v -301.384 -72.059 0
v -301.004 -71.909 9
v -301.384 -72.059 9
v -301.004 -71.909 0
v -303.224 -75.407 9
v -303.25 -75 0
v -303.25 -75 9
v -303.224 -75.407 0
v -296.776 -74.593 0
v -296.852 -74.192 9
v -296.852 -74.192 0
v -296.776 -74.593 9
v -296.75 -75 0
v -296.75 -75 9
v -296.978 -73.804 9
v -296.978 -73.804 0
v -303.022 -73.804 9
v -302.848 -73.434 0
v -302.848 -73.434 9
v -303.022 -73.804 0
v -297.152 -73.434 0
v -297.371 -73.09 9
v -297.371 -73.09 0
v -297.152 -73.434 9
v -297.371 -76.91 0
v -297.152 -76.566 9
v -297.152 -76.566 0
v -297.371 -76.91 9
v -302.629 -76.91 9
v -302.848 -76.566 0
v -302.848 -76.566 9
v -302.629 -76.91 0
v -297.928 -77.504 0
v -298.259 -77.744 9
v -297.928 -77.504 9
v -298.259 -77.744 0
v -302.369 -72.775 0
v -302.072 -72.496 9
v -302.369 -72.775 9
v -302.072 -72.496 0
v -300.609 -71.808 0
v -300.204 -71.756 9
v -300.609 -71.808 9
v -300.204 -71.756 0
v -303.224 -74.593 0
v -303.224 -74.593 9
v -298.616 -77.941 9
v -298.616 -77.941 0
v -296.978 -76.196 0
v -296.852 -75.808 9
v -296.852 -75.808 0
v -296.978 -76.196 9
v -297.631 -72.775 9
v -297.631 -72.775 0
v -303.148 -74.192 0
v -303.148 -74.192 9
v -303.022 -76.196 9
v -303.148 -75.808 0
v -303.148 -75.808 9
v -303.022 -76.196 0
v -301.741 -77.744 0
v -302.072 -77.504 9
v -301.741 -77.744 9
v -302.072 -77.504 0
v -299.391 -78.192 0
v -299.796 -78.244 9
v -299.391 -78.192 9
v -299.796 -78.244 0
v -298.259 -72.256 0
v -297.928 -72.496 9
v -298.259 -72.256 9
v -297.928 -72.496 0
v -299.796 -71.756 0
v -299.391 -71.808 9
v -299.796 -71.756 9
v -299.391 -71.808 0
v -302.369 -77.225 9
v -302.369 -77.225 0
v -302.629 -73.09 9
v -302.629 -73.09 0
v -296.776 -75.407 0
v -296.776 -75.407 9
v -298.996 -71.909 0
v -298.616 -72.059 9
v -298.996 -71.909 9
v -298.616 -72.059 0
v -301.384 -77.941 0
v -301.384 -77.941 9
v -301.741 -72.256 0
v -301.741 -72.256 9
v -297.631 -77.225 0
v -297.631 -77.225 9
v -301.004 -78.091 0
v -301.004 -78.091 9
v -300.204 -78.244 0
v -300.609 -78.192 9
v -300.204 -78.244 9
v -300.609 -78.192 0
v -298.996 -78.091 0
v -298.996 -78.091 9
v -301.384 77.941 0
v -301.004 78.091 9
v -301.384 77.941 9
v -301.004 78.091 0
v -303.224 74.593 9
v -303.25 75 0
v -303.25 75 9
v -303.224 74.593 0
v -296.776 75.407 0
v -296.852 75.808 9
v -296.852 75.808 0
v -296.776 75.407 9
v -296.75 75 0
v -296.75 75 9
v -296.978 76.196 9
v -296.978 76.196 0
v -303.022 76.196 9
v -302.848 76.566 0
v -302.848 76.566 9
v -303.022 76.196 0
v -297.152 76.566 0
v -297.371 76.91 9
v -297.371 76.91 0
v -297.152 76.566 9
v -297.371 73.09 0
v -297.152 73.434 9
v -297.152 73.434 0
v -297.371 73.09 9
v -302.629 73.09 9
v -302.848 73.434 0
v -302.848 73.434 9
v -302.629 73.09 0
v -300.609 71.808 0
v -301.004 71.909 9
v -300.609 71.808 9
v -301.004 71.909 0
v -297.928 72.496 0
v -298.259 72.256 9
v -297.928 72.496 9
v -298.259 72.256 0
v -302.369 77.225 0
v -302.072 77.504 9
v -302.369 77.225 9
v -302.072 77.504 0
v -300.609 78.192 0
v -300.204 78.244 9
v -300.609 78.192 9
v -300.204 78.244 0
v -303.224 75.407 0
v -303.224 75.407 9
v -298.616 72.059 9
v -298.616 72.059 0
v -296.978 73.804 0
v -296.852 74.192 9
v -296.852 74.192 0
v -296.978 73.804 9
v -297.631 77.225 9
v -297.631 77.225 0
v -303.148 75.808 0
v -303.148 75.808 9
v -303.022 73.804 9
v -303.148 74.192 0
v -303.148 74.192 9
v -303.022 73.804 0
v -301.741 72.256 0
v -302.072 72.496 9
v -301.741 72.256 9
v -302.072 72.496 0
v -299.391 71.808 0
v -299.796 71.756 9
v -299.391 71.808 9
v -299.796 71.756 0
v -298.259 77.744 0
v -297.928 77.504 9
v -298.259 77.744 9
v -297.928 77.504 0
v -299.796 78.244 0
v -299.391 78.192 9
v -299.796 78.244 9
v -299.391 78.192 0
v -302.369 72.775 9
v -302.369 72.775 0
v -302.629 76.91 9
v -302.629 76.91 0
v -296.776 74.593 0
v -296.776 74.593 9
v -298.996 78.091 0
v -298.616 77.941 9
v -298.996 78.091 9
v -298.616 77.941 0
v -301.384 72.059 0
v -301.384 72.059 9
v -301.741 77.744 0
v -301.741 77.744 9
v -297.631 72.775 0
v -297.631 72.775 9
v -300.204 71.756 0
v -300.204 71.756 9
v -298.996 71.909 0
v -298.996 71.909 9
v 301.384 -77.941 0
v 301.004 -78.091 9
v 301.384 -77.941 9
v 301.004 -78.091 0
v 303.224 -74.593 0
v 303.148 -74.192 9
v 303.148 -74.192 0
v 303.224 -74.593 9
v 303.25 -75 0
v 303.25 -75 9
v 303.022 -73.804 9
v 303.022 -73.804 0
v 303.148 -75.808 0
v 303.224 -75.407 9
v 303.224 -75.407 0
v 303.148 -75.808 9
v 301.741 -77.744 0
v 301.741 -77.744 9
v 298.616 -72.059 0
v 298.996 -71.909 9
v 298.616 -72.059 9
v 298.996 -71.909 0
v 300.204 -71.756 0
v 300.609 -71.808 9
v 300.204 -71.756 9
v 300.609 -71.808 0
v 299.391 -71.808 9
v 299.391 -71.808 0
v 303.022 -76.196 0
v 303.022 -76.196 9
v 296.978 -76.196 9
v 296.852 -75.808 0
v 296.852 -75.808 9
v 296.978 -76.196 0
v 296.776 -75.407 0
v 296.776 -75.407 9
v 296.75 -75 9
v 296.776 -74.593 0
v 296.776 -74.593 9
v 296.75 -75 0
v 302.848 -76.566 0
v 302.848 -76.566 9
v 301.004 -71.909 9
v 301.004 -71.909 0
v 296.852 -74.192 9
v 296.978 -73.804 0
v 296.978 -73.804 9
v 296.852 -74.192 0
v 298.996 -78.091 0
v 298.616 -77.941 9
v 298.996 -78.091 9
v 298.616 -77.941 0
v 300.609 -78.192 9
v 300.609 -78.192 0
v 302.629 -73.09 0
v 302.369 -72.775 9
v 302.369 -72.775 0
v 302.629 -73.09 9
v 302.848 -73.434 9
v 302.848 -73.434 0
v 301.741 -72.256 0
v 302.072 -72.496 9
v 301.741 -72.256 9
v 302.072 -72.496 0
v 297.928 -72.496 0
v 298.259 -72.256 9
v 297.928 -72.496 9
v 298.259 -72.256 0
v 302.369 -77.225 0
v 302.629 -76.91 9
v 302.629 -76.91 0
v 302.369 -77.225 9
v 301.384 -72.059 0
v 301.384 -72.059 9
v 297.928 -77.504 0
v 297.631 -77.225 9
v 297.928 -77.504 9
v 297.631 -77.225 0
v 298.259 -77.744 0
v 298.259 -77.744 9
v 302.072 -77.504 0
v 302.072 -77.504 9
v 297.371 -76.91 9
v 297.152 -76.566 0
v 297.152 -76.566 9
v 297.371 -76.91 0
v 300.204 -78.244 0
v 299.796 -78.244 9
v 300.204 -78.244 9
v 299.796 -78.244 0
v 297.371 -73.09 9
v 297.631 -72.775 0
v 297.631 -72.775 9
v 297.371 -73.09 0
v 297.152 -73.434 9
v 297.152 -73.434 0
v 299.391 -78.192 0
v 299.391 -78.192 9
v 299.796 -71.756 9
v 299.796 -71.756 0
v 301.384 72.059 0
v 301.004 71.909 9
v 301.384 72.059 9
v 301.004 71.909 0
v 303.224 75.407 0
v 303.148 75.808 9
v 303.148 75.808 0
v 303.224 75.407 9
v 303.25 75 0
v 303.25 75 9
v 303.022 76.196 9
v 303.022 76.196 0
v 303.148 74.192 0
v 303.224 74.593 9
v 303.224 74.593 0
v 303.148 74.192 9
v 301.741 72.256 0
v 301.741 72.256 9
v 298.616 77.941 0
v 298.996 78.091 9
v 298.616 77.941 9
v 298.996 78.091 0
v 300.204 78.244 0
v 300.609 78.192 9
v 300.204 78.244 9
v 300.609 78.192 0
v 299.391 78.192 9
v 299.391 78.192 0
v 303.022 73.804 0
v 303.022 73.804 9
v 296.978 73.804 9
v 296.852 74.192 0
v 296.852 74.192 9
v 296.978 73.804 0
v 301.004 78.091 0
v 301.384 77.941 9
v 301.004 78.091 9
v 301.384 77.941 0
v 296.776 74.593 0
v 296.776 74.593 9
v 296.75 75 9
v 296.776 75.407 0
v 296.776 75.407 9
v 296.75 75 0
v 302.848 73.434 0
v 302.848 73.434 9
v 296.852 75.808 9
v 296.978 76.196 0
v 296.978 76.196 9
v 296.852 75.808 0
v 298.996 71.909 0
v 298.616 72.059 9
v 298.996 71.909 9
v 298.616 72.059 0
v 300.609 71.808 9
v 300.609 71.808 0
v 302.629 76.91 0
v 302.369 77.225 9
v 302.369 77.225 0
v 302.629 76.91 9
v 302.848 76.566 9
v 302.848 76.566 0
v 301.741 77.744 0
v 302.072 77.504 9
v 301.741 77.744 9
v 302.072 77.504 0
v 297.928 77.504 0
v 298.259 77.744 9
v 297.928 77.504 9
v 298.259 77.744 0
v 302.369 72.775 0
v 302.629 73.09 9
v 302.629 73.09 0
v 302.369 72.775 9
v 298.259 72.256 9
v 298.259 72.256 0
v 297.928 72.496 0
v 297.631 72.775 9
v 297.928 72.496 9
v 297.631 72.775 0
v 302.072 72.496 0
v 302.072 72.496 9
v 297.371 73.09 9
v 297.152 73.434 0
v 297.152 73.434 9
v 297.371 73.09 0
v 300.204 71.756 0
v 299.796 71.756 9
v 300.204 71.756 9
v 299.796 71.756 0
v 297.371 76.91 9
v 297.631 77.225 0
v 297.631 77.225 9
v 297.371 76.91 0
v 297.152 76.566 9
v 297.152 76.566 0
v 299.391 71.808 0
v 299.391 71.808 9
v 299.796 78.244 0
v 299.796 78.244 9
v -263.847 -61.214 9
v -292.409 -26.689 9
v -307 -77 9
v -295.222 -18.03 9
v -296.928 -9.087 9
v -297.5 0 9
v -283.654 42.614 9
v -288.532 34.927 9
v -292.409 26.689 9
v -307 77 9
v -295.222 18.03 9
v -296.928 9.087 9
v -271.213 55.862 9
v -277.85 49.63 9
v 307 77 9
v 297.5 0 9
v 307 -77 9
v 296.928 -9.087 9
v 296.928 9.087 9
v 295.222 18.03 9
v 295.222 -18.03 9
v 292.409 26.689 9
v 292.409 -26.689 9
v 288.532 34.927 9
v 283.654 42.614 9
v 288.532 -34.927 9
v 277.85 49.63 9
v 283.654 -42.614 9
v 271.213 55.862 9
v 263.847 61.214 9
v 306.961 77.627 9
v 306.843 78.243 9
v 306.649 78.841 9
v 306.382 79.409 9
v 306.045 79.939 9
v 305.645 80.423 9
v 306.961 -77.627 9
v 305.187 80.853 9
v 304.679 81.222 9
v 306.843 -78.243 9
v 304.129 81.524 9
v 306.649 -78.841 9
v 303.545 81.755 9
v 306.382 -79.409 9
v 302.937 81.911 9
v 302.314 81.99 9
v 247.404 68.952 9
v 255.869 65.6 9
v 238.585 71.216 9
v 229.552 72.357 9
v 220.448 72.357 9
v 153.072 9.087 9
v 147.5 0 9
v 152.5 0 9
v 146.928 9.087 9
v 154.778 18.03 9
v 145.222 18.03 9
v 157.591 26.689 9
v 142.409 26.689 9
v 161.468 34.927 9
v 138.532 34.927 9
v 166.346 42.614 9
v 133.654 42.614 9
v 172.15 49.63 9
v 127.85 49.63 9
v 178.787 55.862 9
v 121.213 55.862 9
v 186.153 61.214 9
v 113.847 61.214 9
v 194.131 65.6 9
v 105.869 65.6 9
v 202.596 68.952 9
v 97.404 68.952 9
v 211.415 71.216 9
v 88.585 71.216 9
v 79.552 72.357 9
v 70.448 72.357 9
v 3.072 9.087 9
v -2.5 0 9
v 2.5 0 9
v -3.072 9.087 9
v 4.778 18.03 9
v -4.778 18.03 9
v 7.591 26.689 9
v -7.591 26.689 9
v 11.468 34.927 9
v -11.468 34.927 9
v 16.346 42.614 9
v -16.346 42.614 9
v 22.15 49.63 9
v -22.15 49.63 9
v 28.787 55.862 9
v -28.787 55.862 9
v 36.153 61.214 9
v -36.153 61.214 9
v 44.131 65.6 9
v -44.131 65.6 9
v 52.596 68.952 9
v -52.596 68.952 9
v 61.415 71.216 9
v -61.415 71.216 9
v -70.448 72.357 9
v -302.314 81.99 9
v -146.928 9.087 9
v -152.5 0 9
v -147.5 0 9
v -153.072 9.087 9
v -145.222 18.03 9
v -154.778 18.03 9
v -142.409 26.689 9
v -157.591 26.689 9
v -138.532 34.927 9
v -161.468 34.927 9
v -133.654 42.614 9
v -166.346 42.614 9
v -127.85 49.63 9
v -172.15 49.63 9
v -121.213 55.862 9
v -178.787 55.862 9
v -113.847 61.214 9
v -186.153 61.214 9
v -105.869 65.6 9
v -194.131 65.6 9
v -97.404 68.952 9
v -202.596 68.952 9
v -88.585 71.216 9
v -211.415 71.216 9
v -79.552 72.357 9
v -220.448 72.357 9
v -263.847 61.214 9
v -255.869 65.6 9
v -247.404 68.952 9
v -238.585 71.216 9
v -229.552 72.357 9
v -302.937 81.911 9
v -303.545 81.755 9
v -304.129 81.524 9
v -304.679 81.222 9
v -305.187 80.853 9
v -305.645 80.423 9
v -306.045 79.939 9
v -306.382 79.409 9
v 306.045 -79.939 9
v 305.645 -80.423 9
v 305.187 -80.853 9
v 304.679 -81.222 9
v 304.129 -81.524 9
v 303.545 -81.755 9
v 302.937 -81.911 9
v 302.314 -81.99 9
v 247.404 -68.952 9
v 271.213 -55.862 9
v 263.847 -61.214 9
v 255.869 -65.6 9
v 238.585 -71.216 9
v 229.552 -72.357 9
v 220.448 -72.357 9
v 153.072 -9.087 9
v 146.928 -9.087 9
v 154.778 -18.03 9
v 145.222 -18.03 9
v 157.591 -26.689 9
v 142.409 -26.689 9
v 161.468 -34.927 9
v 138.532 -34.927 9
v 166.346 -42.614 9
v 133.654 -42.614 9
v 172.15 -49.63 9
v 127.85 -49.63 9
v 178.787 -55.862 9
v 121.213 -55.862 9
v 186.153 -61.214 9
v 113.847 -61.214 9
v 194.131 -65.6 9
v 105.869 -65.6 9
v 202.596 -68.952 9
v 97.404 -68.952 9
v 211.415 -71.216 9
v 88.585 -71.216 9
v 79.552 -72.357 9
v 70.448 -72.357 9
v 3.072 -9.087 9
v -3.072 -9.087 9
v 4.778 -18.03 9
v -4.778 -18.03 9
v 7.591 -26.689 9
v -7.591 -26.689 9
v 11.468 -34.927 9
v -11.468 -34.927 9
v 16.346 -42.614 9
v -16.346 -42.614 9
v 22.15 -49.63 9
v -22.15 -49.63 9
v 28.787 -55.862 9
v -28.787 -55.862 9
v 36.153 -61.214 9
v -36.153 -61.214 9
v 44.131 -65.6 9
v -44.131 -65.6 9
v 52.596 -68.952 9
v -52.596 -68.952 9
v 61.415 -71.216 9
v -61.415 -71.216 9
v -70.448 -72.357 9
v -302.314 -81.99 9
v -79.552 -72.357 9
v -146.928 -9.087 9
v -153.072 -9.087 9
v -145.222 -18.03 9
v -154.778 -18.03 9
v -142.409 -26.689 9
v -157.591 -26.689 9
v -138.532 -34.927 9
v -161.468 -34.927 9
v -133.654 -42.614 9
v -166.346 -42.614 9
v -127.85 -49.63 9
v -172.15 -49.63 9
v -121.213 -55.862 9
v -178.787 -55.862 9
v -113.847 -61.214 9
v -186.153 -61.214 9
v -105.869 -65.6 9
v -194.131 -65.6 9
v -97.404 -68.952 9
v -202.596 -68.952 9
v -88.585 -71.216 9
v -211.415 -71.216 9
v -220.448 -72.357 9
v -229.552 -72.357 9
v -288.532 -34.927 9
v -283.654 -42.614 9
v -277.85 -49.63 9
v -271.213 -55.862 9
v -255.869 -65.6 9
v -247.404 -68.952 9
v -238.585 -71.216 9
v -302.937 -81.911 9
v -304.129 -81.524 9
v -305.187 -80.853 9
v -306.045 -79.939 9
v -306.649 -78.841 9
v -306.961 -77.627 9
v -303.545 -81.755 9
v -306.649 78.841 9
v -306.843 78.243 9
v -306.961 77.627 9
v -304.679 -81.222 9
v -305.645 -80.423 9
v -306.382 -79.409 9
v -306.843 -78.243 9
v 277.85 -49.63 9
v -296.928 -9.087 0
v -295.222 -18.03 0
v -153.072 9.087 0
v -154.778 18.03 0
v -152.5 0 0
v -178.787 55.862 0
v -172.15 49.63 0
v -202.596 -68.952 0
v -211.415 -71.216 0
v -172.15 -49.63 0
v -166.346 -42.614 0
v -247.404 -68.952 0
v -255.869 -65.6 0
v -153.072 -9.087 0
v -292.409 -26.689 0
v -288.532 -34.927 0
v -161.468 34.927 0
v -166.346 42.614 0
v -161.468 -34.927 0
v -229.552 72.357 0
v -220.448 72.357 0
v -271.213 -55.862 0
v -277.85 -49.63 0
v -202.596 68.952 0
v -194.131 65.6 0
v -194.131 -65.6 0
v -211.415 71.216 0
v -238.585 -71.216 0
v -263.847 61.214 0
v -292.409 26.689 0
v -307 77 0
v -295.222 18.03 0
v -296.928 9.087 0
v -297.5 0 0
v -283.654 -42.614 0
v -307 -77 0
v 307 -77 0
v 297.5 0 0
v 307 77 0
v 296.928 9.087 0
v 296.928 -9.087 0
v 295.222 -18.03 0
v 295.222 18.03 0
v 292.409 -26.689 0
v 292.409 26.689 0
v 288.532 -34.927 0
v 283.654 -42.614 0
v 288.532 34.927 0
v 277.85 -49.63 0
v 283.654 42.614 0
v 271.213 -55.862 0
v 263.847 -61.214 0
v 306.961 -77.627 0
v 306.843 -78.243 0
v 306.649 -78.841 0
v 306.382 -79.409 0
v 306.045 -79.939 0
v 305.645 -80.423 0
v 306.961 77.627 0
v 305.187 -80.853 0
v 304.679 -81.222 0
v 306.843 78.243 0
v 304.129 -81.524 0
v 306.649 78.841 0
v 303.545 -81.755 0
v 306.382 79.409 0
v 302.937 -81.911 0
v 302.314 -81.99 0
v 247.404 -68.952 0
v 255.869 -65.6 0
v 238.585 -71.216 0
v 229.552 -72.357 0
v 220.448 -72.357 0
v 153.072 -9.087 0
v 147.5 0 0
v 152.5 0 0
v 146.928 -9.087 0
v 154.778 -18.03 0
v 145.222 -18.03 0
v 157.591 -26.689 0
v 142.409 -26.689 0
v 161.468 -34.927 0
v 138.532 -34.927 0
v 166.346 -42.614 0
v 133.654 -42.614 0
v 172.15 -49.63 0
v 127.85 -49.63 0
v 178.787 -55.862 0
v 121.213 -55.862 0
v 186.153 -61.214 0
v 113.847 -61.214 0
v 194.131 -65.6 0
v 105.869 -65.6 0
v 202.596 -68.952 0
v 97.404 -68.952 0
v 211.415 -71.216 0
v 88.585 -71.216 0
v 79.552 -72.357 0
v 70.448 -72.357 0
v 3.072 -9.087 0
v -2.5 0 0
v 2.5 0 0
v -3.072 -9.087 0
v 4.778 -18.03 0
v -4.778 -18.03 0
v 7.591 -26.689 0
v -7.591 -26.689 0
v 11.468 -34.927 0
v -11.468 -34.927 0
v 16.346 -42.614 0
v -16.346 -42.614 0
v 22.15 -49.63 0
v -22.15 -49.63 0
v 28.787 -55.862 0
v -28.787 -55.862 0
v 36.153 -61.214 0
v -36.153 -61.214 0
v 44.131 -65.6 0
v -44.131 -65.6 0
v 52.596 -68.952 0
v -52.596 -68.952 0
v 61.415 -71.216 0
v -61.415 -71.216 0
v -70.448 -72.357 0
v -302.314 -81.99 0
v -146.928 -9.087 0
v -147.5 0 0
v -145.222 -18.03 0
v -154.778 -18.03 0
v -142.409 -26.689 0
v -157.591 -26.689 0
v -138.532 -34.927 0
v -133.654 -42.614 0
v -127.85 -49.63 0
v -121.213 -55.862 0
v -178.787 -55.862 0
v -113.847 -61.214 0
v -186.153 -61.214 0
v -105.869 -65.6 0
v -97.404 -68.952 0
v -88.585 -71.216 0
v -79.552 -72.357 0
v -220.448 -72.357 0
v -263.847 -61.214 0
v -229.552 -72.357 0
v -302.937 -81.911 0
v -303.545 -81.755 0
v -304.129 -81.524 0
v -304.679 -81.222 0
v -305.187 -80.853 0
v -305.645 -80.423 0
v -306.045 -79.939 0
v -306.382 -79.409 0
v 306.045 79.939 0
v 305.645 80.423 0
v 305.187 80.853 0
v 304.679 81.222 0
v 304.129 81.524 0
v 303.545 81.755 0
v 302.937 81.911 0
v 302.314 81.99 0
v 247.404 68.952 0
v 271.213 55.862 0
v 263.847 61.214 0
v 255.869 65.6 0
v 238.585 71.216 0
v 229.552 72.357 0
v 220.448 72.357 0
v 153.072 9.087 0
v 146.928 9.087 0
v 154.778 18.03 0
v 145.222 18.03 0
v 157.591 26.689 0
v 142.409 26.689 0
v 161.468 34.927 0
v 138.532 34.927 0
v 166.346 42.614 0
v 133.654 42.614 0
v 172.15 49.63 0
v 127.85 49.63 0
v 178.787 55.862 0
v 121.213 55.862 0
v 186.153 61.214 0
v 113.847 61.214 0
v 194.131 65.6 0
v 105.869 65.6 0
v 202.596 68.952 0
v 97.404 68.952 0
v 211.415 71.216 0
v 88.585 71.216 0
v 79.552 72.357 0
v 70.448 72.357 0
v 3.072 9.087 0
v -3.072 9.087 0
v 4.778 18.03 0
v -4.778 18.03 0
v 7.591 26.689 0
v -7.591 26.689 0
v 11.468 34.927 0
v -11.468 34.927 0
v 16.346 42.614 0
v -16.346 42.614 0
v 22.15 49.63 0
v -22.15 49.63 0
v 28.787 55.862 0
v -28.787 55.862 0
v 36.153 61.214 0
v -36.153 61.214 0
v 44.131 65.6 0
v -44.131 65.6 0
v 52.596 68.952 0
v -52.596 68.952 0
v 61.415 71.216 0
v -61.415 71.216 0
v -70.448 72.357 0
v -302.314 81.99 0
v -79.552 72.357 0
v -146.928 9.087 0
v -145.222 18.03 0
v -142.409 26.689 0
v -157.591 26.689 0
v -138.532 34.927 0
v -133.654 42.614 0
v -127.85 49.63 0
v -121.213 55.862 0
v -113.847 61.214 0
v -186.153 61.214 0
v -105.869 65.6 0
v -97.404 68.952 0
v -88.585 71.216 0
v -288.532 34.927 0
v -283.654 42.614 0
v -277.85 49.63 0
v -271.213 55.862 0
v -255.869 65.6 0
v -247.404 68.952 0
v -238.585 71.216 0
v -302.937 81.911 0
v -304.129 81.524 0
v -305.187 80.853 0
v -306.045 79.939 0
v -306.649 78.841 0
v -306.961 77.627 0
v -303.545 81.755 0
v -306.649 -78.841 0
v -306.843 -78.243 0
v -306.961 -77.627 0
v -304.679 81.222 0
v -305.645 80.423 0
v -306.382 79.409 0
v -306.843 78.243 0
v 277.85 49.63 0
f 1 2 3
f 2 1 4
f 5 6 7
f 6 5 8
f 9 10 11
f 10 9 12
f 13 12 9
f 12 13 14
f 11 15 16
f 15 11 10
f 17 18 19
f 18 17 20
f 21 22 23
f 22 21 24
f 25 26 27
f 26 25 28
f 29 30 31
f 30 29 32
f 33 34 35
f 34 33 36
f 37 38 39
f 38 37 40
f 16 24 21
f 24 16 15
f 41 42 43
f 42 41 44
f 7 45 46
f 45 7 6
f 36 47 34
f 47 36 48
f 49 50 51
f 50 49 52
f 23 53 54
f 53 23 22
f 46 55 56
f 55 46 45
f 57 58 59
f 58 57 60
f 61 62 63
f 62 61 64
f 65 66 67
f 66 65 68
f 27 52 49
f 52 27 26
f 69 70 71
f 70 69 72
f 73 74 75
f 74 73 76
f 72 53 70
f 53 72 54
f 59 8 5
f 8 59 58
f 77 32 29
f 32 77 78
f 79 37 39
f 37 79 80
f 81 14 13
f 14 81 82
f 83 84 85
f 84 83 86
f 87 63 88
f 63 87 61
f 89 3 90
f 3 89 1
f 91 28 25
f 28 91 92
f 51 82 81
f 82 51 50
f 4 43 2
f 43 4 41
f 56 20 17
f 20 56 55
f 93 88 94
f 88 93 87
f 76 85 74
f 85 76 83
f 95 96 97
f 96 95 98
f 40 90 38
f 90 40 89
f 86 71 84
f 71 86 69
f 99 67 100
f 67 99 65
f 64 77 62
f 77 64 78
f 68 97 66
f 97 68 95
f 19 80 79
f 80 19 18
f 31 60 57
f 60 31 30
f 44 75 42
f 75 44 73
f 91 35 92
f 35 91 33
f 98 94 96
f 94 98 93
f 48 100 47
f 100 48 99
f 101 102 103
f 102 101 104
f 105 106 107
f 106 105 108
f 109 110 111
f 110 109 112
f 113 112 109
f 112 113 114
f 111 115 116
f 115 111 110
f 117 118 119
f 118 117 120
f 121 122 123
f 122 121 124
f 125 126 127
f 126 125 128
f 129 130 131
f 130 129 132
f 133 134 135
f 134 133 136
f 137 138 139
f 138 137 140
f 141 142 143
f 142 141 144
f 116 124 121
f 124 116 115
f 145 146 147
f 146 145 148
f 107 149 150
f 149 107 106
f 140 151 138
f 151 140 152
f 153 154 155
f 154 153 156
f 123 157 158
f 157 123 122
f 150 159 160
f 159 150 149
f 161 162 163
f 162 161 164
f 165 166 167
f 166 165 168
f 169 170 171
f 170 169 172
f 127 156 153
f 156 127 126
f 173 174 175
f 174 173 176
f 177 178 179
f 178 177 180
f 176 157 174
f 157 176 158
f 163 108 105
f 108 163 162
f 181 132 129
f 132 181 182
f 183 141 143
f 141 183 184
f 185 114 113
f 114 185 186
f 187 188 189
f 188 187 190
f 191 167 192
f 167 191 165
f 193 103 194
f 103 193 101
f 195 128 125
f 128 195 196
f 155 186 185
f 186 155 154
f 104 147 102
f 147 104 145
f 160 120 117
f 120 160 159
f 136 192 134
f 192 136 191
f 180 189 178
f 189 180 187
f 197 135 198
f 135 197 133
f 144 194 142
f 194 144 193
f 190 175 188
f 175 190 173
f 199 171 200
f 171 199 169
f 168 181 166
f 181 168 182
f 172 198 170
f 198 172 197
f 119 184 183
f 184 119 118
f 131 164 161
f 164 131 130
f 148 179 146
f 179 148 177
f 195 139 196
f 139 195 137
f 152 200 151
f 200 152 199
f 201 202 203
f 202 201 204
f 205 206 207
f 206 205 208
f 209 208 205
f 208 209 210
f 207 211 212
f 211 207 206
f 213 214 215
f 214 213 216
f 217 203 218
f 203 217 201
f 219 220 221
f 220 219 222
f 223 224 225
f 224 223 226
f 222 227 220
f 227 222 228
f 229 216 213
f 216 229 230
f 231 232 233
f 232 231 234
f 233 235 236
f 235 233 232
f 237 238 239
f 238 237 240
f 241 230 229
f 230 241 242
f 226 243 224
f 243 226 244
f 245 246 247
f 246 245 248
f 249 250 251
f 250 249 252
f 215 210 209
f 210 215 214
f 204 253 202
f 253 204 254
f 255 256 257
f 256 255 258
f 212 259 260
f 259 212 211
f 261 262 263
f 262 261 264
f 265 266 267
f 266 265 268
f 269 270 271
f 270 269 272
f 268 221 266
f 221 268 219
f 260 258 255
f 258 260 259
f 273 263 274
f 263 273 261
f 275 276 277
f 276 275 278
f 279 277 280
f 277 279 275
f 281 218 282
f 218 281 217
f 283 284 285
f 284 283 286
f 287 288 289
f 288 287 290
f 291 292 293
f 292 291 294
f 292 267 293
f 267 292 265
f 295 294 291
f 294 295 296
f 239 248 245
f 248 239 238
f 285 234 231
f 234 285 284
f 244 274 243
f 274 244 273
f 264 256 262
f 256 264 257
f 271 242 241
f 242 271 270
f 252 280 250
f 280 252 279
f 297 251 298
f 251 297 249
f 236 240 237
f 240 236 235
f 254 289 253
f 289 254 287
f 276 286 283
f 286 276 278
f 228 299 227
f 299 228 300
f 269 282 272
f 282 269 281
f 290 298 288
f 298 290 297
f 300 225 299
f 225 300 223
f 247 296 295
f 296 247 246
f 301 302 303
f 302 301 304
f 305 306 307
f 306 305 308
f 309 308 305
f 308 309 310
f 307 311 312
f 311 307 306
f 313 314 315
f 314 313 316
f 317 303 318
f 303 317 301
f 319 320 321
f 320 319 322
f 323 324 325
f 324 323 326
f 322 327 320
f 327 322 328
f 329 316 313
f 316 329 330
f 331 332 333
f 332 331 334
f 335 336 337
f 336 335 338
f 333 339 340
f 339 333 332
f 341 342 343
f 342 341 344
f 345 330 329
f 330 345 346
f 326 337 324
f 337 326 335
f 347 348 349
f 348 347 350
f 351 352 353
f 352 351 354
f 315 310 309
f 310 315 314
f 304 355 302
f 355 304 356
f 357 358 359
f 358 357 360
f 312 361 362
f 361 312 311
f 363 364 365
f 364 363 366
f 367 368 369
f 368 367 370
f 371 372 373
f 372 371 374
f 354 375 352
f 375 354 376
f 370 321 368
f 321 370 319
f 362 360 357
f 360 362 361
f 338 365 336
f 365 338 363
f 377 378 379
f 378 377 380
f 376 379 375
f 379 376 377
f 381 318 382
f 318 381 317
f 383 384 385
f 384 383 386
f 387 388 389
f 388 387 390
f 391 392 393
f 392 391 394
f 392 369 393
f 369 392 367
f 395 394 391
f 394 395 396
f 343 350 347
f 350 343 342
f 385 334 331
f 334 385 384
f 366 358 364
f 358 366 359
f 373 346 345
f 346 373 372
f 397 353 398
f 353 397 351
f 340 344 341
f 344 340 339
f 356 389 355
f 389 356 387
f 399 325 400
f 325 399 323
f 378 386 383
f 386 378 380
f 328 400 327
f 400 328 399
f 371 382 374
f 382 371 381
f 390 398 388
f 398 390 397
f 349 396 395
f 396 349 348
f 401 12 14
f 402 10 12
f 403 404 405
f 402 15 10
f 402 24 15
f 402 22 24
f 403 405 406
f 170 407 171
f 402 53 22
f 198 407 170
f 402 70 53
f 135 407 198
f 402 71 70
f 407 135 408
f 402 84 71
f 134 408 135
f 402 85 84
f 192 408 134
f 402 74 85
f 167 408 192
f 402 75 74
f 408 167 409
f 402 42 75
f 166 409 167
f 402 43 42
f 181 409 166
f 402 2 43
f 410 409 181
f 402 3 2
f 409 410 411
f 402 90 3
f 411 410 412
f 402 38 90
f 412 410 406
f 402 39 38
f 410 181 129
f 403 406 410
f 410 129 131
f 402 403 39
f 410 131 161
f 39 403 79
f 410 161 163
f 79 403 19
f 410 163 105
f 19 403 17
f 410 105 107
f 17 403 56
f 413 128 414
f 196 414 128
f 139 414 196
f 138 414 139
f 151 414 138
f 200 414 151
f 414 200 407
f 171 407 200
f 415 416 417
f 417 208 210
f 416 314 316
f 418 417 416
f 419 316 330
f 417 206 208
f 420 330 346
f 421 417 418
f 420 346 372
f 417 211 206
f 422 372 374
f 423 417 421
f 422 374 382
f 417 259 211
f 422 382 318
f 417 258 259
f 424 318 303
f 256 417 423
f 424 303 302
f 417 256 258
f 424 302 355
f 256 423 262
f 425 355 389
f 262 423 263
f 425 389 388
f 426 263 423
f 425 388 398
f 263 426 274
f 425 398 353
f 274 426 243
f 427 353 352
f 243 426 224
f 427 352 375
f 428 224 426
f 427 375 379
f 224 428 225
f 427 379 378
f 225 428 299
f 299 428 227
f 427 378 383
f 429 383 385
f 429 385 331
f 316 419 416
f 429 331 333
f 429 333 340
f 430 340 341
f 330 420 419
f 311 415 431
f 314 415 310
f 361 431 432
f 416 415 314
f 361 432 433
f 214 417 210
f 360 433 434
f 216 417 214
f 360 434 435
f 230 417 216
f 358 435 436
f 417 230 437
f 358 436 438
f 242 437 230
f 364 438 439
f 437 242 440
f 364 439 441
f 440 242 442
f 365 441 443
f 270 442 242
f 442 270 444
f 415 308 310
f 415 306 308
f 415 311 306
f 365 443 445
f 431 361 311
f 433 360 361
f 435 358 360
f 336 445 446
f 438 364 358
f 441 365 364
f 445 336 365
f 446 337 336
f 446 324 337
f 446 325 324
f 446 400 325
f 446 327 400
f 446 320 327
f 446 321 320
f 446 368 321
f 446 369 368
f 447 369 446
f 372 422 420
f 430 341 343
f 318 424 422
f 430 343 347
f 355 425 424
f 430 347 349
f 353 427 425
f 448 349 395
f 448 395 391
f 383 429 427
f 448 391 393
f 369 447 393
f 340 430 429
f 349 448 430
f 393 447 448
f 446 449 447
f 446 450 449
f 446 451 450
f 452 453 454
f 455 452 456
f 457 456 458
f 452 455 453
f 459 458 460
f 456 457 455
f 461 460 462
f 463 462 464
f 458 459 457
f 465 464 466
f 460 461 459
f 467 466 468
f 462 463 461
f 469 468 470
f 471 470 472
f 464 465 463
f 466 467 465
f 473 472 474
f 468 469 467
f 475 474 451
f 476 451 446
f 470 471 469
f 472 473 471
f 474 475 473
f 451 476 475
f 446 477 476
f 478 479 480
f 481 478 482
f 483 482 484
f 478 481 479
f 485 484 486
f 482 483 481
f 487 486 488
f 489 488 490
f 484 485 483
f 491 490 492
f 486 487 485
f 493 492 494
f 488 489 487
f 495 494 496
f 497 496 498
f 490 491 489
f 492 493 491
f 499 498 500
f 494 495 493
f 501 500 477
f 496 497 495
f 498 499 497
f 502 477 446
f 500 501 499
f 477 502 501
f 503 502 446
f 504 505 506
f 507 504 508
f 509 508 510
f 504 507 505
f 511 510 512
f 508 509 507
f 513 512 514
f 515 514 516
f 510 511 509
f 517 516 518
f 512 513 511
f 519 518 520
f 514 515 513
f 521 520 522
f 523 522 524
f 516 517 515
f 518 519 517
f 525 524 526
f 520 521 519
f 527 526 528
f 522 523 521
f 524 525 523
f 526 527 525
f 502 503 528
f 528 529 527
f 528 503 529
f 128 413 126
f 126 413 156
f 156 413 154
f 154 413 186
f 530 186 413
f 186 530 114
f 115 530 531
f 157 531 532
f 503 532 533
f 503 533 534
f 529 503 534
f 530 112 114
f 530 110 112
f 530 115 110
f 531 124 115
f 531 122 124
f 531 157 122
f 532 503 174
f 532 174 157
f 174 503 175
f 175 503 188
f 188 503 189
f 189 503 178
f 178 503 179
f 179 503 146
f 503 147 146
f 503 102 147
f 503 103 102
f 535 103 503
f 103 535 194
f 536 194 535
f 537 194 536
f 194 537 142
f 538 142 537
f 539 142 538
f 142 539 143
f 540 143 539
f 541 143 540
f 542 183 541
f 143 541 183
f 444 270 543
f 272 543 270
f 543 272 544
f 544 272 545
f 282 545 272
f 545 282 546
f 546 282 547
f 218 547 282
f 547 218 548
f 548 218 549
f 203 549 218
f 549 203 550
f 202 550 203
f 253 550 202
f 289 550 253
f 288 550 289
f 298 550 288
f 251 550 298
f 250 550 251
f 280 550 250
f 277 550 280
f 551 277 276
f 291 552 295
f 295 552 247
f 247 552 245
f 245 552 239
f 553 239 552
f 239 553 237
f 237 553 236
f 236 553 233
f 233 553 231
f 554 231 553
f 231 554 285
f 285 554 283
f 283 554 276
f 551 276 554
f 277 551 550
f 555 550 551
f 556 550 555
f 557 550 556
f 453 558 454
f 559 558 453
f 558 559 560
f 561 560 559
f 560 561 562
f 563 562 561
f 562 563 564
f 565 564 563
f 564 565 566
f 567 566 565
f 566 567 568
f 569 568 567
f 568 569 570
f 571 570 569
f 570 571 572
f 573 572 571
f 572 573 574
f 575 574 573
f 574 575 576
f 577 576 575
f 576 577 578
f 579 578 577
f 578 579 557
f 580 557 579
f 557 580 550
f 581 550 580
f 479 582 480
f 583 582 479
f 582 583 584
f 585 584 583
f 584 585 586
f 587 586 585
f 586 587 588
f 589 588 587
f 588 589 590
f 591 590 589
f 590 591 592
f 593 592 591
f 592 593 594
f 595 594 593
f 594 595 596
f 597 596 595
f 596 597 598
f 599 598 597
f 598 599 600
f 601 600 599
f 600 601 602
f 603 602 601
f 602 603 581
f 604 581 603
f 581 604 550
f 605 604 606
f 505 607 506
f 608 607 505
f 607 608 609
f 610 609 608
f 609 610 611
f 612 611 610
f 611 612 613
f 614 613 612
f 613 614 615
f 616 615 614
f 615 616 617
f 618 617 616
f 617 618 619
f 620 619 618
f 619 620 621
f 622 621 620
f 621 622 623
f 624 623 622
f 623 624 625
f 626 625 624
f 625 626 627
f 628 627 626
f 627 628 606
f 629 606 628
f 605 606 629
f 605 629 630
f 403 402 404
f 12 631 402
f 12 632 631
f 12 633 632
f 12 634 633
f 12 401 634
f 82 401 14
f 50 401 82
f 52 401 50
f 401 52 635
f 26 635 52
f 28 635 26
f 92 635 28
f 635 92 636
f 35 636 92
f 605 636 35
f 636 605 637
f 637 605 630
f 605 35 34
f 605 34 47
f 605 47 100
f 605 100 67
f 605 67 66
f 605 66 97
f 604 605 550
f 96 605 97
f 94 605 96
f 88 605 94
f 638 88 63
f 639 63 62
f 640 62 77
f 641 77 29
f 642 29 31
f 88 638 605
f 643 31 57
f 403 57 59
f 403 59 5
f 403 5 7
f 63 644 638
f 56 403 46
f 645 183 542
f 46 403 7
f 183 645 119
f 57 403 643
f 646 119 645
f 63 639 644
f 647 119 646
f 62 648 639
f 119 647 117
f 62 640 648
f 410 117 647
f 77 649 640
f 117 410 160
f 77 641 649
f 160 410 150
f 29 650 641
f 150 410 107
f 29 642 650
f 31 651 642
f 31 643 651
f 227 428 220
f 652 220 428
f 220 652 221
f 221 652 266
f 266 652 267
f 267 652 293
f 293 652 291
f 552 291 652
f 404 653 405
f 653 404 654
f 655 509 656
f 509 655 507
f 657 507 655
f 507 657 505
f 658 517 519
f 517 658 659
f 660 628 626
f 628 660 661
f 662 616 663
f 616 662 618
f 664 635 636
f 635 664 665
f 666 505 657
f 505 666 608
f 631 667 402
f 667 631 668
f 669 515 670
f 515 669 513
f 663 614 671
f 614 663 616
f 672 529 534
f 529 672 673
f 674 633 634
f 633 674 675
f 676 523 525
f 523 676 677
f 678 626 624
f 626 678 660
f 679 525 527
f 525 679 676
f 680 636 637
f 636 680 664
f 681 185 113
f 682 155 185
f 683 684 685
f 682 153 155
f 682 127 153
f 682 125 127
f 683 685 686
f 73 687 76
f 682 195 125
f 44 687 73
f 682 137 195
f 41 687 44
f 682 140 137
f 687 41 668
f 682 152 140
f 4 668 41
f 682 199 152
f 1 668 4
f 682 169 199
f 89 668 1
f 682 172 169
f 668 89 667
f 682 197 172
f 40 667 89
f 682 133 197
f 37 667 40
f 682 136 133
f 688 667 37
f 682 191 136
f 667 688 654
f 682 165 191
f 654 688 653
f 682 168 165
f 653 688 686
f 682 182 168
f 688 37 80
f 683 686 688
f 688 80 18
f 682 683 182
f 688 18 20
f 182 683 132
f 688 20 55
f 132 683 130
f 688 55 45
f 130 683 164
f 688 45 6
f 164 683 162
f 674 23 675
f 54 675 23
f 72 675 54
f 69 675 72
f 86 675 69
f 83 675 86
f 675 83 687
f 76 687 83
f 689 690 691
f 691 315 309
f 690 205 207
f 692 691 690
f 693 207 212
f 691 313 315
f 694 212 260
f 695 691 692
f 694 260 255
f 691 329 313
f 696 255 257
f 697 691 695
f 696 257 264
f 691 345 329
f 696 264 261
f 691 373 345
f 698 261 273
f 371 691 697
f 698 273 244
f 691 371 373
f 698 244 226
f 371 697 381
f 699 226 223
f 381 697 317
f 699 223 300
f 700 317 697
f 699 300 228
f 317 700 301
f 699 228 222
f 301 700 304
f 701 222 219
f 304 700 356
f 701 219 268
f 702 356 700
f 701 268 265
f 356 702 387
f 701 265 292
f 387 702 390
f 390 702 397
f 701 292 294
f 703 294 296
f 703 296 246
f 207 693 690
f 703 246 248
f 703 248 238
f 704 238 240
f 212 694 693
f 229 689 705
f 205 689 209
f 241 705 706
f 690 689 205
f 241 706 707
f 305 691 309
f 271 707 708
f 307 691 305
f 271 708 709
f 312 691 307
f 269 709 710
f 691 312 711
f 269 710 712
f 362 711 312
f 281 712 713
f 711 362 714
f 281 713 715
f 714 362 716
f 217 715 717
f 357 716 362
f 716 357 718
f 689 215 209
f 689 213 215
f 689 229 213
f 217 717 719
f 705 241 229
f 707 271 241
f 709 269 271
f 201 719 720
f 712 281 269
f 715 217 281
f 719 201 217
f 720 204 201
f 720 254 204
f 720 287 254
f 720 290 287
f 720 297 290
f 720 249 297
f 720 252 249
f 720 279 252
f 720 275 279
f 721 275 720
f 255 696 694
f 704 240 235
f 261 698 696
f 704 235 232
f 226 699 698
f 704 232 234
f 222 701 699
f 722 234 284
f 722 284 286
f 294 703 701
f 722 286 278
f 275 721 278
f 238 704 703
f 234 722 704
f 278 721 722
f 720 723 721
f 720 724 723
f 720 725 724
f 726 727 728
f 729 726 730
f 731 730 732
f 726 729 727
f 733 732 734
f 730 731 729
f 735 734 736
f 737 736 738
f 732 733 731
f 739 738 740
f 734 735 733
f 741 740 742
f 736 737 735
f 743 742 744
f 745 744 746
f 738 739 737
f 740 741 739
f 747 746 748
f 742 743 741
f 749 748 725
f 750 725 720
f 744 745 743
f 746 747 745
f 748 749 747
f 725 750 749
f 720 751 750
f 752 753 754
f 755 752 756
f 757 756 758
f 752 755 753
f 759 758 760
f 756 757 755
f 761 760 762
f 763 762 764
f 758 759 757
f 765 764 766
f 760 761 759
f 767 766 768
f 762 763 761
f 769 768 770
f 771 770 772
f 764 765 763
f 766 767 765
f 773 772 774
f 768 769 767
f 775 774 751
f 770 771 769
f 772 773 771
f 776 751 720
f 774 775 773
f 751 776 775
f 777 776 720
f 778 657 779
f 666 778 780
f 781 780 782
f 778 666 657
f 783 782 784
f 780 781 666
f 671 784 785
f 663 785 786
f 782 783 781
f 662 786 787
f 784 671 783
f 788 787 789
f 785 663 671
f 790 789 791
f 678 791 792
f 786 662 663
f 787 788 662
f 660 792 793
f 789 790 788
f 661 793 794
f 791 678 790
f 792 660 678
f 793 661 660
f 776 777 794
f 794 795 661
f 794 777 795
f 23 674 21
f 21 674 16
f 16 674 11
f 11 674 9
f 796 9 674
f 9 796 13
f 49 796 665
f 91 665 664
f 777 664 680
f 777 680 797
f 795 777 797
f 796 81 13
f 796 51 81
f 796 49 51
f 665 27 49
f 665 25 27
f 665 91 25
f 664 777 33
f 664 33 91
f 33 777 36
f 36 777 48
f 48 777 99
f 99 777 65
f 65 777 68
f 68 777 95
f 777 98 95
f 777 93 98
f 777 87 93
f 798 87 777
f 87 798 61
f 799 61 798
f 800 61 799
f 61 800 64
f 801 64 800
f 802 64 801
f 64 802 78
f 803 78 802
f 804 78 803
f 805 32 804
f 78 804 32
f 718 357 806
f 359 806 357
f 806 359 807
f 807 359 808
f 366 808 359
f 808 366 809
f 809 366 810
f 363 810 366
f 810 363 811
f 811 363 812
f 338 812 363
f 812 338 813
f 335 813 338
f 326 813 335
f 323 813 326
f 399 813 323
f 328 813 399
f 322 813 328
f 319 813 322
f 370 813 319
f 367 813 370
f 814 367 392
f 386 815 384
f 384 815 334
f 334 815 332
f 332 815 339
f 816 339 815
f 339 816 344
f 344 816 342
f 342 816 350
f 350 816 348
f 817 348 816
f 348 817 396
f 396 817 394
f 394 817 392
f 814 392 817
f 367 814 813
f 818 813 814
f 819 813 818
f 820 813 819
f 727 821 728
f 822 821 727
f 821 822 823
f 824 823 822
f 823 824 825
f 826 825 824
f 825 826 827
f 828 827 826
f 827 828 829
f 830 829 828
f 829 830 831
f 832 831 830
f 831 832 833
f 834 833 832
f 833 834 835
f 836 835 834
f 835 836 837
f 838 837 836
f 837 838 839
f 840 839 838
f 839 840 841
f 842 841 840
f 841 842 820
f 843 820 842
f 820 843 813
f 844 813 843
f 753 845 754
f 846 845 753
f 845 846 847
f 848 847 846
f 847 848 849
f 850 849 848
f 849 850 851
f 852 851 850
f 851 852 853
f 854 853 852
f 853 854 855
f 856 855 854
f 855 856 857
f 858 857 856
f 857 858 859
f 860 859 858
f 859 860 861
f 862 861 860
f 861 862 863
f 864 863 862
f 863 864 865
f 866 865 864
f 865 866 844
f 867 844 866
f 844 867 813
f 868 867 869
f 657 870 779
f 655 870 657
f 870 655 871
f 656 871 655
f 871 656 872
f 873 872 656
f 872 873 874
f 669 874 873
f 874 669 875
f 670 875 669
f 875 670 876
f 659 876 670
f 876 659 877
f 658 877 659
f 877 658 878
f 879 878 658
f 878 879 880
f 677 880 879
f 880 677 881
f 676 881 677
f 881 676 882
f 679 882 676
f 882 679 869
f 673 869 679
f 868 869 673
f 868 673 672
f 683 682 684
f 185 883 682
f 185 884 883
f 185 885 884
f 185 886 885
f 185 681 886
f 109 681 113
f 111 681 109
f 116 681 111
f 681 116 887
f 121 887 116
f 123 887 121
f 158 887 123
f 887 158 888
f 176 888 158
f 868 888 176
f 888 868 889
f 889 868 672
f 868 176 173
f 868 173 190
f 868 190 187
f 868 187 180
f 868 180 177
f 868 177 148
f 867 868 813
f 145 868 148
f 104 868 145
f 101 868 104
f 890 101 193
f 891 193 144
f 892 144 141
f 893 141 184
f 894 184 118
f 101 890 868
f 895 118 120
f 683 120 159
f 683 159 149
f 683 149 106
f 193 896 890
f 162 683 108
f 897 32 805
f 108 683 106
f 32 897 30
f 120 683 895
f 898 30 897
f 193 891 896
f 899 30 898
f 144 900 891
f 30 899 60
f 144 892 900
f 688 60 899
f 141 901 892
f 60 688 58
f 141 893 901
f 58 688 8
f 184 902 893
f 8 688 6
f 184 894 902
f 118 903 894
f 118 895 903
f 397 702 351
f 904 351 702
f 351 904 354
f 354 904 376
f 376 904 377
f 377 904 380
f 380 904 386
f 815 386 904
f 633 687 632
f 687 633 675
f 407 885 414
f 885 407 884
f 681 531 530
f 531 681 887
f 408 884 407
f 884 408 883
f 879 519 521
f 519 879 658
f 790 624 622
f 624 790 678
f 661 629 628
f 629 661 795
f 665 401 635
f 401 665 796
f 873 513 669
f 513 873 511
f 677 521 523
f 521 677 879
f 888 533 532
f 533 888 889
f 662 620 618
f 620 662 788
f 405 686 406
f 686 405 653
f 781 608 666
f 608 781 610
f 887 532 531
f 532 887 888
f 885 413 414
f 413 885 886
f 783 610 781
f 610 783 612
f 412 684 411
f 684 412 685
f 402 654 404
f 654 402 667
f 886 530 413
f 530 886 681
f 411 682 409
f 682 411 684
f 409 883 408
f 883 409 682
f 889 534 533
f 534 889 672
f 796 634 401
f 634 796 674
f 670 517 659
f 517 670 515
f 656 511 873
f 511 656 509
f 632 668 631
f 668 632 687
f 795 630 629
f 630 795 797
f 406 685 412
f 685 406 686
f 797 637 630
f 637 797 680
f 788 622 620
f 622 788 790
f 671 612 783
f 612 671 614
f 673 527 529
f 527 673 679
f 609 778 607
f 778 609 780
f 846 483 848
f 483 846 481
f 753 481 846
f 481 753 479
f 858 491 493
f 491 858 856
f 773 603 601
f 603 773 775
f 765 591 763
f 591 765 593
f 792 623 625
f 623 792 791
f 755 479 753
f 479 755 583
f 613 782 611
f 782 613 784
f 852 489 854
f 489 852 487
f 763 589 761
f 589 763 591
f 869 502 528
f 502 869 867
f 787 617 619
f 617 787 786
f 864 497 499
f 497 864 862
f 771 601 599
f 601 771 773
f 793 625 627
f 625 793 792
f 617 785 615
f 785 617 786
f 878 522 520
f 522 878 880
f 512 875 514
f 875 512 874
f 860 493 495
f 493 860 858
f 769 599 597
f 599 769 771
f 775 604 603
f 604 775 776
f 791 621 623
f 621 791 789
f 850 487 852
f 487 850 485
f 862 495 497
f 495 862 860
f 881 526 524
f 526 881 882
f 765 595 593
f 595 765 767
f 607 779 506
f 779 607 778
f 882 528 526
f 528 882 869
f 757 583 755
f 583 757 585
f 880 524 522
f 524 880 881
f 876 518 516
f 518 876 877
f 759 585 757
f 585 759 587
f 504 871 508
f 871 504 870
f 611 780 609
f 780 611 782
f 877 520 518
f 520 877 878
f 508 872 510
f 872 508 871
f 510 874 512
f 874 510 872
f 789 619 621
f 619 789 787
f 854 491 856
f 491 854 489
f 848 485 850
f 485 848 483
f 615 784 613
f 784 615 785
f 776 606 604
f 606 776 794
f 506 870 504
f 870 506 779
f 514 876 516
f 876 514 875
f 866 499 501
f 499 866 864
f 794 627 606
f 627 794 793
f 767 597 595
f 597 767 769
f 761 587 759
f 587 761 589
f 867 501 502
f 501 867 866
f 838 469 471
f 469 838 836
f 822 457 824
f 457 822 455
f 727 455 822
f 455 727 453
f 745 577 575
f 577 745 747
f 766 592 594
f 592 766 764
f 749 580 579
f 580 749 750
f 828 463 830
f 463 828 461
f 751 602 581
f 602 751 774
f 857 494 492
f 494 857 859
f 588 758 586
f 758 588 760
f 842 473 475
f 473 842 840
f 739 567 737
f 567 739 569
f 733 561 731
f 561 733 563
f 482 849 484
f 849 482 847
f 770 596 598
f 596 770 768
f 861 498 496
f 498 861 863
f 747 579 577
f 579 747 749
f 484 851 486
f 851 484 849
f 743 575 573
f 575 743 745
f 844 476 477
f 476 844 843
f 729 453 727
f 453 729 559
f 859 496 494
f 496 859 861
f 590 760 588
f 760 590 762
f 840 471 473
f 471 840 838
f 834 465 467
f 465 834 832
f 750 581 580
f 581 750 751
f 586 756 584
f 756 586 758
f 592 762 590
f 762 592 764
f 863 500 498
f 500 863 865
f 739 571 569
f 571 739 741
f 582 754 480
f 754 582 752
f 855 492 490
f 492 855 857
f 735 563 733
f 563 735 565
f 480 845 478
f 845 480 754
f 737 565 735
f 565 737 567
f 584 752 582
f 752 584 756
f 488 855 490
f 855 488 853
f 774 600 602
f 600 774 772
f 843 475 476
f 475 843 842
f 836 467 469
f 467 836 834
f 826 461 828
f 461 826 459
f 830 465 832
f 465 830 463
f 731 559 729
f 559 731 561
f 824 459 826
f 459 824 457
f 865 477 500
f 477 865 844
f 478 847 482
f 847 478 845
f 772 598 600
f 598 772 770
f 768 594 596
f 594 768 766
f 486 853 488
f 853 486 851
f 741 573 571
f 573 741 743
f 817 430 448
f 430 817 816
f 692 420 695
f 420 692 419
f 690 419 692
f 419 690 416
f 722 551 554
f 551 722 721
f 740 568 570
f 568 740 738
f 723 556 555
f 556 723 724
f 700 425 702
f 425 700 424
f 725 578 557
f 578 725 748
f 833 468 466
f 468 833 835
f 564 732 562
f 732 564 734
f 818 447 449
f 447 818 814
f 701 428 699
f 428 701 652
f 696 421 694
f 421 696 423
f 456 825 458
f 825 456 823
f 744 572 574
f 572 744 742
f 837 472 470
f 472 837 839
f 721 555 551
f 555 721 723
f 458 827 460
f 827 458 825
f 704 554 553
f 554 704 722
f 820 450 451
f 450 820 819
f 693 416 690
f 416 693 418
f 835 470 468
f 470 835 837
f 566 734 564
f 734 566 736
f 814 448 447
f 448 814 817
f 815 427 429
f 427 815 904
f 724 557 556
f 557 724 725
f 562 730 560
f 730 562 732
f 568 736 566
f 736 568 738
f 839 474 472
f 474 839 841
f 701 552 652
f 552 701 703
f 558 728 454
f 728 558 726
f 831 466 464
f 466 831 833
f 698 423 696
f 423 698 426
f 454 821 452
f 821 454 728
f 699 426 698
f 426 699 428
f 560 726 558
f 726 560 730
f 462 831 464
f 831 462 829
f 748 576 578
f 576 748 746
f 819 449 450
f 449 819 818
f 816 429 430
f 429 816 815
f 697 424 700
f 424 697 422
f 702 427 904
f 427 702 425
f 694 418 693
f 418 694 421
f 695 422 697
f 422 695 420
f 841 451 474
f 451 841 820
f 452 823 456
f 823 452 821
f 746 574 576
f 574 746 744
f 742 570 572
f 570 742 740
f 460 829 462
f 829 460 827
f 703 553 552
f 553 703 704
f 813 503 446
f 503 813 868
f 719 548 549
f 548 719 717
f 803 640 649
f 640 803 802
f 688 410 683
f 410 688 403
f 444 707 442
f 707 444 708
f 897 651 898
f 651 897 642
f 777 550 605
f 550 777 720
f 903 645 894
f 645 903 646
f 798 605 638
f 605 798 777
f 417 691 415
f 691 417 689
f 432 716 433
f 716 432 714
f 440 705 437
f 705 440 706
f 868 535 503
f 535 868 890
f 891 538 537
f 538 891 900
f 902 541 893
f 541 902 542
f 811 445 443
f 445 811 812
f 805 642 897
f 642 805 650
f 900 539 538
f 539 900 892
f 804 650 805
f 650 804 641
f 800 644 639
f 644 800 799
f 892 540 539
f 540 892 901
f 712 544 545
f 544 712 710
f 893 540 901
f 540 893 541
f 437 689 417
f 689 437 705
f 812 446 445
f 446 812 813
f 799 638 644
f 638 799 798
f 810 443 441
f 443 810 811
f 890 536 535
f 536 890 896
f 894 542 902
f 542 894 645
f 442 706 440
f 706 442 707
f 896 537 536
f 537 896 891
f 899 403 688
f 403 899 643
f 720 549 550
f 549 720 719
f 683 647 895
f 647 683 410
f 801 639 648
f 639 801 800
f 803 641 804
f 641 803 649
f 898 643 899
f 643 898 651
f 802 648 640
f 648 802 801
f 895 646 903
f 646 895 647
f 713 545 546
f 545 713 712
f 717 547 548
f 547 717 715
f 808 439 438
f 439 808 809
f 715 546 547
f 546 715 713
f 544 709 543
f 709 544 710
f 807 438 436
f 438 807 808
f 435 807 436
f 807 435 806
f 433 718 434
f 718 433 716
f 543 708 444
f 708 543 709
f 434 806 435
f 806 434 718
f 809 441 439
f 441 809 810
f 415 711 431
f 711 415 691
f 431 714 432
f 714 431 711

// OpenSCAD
$fn = 50;


difference() {
	union() {
		hull() {
			translate(v = [-302.0000000000, 77.0000000000, 0]) {
				cylinder(h = 9, r = 5);
			}
			translate(v = [302.0000000000, 77.0000000000, 0]) {
				cylinder(h = 9, r = 5);
			}
			translate(v = [-302.0000000000, -77.0000000000, 0]) {
				cylinder(h = 9, r = 5);
			}
			translate(v = [302.0000000000, -77.0000000000, 0]) {
				cylinder(h = 9, r = 5);
			}
		}
	}
	union() {
		#translate(v = [-300.0000000000, -75.0000000000, -100.0000000000]) {
			cylinder(h = 200, r = 3.2500000000);
		}
		#translate(v = [-300.0000000000, 75.0000000000, -100.0000000000]) {
			cylinder(h = 200, r = 3.2500000000);
		}
		#translate(v = [300.0000000000, -75.0000000000, -100.0000000000]) {
			cylinder(h = 200, r = 3.2500000000);
		}
		#translate(v = [300.0000000000, 75.0000000000, -100.0000000000]) {
			cylinder(h = 200, r = 3.2500000000);
		}
		#translate(v = [-225.0000000000, 0, 0]) {
			cylinder(h = 9, r = 72.5000000000);
		}
		#translate(v = [-75.0000000000, 0, 0]) {
			cylinder(h = 9, r = 72.5000000000);
		}
		#translate(v = [75.0000000000, 0, 0]) {
			cylinder(h = 9, r = 72.5000000000);
		}
		#translate(v = [225.0000000000, 0, 0]) {
			cylinder(h = 9, r = 72.5000000000);
		}
	}
}
